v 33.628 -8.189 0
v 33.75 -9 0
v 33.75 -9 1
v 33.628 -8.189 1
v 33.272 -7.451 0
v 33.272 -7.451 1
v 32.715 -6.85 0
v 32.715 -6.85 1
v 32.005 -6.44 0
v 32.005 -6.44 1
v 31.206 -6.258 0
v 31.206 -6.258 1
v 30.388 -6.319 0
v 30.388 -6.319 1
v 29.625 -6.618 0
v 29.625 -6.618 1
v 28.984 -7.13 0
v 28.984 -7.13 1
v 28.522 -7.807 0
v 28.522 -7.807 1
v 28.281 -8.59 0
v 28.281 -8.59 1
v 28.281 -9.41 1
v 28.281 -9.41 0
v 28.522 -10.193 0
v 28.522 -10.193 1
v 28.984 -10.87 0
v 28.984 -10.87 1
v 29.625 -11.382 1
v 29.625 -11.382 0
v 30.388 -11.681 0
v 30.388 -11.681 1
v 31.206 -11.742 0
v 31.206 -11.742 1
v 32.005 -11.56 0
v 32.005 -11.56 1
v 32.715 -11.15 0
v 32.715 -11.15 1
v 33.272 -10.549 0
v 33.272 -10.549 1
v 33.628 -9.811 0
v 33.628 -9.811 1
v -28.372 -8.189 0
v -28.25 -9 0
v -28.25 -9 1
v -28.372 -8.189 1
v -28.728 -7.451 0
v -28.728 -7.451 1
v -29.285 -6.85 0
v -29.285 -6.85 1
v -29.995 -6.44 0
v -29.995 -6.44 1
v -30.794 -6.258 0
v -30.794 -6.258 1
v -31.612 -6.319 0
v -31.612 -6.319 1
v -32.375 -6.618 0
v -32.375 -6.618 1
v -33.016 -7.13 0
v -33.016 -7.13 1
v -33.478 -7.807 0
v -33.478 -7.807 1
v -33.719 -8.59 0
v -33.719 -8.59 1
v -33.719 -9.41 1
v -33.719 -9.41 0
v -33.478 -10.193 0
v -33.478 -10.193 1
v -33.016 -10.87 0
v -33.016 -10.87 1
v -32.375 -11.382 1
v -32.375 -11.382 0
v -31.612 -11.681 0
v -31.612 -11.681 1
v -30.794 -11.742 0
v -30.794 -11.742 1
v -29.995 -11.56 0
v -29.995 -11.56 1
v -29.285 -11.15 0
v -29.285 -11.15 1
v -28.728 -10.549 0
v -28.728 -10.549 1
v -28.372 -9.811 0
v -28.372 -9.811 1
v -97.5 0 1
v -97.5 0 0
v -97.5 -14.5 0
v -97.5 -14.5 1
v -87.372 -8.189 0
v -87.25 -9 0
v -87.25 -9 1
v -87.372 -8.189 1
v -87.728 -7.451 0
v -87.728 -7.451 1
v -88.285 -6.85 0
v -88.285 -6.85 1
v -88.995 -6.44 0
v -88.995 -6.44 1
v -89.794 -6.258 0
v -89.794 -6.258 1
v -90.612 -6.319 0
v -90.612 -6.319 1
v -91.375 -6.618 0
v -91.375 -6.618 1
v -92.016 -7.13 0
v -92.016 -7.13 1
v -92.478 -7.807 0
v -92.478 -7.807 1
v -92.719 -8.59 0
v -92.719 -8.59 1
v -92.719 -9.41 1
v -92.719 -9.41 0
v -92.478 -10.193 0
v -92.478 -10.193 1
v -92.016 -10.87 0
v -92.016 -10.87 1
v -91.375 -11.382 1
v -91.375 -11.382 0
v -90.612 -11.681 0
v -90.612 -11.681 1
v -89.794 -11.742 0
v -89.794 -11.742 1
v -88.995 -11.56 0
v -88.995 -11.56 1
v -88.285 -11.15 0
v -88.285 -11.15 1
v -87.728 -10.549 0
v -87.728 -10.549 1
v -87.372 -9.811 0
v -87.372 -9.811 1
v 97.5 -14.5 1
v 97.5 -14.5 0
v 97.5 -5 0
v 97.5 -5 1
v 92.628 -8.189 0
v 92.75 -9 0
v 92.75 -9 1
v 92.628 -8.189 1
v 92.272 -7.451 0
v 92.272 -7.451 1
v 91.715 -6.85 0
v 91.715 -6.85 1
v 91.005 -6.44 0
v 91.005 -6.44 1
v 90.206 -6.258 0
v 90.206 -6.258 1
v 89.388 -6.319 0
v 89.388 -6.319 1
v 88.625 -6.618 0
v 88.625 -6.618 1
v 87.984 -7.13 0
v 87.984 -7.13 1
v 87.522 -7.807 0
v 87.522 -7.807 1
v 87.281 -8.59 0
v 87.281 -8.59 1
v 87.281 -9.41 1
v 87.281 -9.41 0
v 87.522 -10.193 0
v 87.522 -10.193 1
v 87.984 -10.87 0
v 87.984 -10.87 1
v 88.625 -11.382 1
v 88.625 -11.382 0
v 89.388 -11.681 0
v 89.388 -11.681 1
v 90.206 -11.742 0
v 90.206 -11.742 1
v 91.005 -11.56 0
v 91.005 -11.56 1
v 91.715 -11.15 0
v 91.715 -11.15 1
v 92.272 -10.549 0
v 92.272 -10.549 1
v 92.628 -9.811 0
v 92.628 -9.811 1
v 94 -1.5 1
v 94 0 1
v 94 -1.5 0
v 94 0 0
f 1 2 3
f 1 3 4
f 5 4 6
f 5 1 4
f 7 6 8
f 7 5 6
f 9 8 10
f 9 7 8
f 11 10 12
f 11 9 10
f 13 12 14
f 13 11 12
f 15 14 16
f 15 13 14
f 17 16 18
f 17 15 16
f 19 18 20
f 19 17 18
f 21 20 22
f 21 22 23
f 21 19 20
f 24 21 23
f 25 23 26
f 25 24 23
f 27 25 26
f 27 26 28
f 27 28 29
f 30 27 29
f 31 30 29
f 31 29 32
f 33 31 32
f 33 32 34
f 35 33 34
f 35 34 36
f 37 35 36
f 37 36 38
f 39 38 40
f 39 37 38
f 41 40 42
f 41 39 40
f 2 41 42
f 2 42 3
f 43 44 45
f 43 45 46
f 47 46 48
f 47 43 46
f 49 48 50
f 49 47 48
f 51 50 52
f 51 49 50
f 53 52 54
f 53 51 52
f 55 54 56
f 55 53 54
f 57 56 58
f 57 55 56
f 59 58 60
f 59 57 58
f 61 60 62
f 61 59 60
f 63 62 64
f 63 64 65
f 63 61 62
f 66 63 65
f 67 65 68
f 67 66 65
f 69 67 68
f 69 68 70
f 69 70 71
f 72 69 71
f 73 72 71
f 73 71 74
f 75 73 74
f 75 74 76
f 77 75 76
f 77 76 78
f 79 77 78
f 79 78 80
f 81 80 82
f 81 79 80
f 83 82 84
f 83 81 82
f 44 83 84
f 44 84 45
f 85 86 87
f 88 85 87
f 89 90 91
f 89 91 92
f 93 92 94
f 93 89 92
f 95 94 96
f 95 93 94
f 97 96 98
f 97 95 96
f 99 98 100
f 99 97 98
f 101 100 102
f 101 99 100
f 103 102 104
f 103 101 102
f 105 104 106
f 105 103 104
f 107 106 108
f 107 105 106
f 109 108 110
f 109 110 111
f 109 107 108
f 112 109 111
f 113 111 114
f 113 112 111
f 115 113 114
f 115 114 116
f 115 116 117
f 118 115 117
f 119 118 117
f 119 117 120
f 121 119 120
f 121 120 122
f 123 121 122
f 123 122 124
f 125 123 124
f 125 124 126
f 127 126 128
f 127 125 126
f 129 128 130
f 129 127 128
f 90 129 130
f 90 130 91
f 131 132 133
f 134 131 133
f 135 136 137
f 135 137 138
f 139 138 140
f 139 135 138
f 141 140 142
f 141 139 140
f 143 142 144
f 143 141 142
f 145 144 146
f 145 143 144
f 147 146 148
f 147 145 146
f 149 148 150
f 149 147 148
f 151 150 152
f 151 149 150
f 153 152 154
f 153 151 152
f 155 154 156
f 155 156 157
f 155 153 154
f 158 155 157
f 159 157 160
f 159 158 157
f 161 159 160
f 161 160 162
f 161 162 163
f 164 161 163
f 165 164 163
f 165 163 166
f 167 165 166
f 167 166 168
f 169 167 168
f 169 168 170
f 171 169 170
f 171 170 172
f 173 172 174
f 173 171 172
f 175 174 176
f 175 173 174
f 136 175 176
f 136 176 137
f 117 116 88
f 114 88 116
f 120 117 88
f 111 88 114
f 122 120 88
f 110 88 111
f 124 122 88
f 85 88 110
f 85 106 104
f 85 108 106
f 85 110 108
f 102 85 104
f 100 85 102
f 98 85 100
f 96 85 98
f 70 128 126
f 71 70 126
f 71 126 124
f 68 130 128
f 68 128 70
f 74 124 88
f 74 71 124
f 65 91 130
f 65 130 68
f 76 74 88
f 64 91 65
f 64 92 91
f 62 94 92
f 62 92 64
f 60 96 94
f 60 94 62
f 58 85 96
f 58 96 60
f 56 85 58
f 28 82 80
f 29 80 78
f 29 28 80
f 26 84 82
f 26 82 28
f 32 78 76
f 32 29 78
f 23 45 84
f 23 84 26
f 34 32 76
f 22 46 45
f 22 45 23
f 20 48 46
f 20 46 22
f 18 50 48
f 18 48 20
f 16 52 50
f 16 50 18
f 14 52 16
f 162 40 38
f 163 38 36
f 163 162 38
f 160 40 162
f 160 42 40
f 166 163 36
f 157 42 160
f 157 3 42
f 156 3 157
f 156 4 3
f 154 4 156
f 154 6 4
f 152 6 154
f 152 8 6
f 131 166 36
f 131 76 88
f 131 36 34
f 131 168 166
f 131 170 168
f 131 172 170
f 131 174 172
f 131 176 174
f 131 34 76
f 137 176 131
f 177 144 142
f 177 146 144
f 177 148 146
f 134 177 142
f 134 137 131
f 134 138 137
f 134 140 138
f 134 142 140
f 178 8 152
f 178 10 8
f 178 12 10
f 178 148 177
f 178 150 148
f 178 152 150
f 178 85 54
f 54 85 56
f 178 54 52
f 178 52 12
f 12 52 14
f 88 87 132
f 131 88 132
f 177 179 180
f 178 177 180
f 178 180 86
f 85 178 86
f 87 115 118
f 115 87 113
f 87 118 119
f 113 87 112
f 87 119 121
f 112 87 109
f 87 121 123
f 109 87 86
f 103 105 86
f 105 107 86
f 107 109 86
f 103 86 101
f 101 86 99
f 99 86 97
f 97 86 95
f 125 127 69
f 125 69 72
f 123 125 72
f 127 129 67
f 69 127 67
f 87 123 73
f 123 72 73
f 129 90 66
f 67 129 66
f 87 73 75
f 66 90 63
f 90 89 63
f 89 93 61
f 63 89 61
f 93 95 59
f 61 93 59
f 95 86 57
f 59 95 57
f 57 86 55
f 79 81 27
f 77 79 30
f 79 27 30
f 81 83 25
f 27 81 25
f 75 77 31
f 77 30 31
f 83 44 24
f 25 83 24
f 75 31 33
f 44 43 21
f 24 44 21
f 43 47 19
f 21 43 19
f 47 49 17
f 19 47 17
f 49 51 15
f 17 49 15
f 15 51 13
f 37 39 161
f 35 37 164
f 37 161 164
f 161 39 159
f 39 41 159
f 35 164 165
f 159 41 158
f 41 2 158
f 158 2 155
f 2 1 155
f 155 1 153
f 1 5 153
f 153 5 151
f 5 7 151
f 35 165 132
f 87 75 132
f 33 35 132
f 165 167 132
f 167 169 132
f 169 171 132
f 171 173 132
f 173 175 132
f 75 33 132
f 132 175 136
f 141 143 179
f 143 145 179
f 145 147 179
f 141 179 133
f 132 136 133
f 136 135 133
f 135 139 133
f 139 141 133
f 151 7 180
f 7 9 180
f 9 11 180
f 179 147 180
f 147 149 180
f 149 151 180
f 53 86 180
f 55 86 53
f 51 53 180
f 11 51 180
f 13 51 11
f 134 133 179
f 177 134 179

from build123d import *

# Parameters (mm, degrees)
WIDE_FLANGE_WITH_ORIGINAL_FLOOR_BOLT_2_R       = 2.75
WIDE_FLANGE_WITH_ORIGINAL_FLOOR_BOLT_CEN_DEPTH = 1


with BuildPart() as part:
    # Wide flange with original floor bolt 2 → Wide flange with original floor bolt cen (new body)
    with BuildSketch(Plane.XY):
        Polygon((-97.5, -14.5), (97.5, -14.5), (97.5, -5), (94, -1.5), (94, 0), (-97.5, 0), align=None)
        with Locations((-90, -9)):
            Circle(WIDE_FLANGE_WITH_ORIGINAL_FLOOR_BOLT_2_R, mode=Mode.SUBTRACT)
        with Locations((-31, -9)):
            Circle(WIDE_FLANGE_WITH_ORIGINAL_FLOOR_BOLT_2_R, mode=Mode.SUBTRACT)
        with Locations((31, -9)):
            Circle(WIDE_FLANGE_WITH_ORIGINAL_FLOOR_BOLT_2_R, mode=Mode.SUBTRACT)
        with Locations((90, -9)):
            Circle(WIDE_FLANGE_WITH_ORIGINAL_FLOOR_BOLT_2_R, mode=Mode.SUBTRACT)
    extrude(amount=WIDE_FLANGE_WITH_ORIGINAL_FLOOR_BOLT_CEN_DEPTH)


solid = part.part
